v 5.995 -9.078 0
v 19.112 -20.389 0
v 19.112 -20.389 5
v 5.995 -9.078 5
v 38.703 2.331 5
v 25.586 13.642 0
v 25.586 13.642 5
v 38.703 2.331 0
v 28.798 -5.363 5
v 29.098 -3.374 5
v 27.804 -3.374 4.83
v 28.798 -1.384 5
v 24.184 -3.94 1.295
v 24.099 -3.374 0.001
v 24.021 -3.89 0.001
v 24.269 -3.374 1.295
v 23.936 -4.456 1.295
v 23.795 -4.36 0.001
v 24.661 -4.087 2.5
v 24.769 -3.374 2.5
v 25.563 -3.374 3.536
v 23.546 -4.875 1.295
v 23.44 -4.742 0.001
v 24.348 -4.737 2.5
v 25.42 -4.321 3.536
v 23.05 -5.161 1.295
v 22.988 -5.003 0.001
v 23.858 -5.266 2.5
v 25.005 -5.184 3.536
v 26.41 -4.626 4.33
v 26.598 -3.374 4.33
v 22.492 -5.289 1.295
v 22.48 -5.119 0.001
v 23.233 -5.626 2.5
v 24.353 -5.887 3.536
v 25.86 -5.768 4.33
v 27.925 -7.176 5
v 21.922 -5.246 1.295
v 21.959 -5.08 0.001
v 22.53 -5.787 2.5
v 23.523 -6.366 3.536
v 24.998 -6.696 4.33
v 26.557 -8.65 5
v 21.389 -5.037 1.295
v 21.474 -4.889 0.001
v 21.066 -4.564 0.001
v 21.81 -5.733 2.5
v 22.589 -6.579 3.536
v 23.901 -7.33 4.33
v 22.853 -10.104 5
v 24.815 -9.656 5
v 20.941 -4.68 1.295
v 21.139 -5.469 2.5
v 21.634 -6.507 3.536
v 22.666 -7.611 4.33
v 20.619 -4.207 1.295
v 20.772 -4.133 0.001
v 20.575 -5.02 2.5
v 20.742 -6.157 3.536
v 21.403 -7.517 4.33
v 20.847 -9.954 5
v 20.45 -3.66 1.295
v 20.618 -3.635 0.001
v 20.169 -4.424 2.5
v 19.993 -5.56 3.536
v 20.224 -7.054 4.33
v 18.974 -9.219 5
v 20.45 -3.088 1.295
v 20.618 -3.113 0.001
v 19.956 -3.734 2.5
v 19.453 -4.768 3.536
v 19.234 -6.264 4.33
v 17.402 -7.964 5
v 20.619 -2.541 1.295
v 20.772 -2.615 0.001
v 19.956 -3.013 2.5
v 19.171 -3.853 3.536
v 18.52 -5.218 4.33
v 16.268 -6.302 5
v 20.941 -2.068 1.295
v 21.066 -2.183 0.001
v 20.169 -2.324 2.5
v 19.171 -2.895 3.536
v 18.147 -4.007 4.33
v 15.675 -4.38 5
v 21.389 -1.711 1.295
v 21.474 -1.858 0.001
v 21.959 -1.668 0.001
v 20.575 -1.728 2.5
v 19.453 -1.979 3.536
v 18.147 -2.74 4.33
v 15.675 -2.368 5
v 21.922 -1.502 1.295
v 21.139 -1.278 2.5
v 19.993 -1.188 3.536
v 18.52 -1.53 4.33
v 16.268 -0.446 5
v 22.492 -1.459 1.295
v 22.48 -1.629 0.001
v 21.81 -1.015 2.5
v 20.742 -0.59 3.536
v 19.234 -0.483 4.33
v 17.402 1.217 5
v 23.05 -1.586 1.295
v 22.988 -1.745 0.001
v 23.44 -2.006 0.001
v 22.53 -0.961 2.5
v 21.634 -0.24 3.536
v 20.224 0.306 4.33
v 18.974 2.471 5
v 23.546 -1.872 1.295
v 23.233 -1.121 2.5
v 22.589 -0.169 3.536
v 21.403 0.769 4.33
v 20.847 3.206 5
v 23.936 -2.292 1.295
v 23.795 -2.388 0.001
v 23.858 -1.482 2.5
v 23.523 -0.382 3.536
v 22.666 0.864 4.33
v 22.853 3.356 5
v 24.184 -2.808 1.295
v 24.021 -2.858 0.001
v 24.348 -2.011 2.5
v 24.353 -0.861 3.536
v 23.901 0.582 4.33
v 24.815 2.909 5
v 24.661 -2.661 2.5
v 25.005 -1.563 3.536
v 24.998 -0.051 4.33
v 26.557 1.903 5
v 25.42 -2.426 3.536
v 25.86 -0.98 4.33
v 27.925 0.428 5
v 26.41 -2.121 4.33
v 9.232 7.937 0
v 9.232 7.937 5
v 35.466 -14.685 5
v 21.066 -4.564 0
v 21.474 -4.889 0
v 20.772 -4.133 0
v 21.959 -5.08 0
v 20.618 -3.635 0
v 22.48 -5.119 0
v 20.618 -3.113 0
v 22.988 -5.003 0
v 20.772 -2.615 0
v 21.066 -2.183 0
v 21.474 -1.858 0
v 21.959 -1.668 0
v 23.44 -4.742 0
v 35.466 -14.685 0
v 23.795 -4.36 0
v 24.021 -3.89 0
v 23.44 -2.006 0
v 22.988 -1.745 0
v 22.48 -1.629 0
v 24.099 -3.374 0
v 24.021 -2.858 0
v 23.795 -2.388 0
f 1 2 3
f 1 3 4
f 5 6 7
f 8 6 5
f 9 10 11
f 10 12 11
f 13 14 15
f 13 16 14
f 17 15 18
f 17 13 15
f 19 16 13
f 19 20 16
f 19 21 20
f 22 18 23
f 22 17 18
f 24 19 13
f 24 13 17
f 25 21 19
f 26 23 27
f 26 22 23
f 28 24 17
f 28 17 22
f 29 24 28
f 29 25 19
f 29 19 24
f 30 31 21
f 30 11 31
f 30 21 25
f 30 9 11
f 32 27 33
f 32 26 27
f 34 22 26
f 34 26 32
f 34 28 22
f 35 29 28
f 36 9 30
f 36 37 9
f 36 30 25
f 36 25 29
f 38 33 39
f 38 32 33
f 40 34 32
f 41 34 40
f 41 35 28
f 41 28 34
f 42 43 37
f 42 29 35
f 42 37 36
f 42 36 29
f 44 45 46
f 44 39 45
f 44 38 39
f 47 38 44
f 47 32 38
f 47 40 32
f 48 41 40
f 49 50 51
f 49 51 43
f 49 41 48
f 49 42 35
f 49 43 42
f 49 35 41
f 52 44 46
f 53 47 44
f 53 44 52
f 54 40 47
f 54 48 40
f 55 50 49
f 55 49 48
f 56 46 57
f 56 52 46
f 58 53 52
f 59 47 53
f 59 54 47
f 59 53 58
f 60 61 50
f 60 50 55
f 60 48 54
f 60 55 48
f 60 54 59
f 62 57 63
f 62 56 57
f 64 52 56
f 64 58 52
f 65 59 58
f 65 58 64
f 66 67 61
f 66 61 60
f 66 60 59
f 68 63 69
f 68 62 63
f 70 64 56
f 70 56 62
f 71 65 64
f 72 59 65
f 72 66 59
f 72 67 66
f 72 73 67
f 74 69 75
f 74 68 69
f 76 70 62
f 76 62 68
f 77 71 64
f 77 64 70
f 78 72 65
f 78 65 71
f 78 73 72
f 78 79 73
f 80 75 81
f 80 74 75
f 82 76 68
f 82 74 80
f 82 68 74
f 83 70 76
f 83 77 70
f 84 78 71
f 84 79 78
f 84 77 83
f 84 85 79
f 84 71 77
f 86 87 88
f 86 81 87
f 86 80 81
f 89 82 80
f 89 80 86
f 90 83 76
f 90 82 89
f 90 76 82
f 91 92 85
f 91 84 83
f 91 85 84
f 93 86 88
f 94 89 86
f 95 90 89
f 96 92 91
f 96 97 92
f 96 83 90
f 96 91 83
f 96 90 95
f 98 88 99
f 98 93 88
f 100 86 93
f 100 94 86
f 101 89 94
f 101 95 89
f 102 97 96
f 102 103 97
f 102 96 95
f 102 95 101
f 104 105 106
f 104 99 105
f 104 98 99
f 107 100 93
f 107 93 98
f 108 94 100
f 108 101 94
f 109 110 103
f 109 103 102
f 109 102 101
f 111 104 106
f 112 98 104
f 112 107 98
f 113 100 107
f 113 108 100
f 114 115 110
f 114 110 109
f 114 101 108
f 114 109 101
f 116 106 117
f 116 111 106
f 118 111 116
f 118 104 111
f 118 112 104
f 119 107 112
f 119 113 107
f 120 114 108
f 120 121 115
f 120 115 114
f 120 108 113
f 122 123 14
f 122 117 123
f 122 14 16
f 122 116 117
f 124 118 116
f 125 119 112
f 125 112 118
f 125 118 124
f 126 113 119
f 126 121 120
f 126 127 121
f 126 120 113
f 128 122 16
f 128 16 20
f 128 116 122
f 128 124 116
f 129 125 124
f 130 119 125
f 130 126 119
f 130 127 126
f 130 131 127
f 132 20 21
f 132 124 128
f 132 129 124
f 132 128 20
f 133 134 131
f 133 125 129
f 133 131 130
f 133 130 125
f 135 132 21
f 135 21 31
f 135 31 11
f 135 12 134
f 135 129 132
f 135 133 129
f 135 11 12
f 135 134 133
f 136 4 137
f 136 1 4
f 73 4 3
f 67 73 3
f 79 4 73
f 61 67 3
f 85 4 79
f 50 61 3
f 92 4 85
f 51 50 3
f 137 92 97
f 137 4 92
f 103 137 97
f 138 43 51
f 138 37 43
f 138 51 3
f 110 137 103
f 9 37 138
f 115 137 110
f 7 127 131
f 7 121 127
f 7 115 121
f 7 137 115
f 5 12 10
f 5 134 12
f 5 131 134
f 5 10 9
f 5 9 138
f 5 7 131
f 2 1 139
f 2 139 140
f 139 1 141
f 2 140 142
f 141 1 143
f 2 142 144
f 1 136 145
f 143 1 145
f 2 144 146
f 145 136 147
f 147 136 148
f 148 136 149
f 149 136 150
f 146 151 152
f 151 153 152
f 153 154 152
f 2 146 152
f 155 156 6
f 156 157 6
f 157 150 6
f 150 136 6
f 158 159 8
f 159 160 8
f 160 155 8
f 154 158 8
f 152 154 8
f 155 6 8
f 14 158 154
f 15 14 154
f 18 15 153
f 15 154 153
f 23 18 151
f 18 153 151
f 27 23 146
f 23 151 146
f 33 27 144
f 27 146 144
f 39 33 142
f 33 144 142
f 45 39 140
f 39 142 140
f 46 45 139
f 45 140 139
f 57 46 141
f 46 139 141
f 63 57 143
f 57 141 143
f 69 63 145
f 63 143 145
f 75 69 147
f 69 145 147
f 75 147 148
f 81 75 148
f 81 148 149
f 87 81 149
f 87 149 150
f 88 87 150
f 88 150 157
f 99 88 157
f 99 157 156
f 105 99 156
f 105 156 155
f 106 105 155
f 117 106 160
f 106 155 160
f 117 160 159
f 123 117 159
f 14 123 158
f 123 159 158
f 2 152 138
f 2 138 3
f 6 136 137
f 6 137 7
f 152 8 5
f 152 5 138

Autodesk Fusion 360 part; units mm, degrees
sketch "Sketch1" plane through (0, 0, 0) normal (0, 0, 1) x (1, 0, 0)
  line L0 (9.2315, 7.937) -> (25.5856, 13.6416)
  line L1 (25.5856, 13.6416) -> (38.703, 2.3308)
  line L2 (38.703, 2.3308) -> (35.4663, -14.6846)
  line L3 (35.4663, -14.6846) -> (19.1122, -20.3892)
  line L4 (19.1122, -20.3892) -> (5.9948, -9.0784)
  line L5 (5.9948, -9.0784) -> (9.2315, 7.937)
  circle A0 centre (22.3489, -3.3738) radius 1.75
  dimension "d1" = 120
  dimension "d2" = 120
  dimension "d3" = 120
  dimension "d4" = 120
  dimension "d5" = 120
  dimension "d6" = 30
  dimension "d7" = 30
  dimension "d8" = 30
  dimension "d9" = 3.5
extrude "Extrude1" add sketch "Sketch1" along normal blind 5
fillet "Fillet1" radius 5 1 edges at (20.7173, -2.741, 5)
